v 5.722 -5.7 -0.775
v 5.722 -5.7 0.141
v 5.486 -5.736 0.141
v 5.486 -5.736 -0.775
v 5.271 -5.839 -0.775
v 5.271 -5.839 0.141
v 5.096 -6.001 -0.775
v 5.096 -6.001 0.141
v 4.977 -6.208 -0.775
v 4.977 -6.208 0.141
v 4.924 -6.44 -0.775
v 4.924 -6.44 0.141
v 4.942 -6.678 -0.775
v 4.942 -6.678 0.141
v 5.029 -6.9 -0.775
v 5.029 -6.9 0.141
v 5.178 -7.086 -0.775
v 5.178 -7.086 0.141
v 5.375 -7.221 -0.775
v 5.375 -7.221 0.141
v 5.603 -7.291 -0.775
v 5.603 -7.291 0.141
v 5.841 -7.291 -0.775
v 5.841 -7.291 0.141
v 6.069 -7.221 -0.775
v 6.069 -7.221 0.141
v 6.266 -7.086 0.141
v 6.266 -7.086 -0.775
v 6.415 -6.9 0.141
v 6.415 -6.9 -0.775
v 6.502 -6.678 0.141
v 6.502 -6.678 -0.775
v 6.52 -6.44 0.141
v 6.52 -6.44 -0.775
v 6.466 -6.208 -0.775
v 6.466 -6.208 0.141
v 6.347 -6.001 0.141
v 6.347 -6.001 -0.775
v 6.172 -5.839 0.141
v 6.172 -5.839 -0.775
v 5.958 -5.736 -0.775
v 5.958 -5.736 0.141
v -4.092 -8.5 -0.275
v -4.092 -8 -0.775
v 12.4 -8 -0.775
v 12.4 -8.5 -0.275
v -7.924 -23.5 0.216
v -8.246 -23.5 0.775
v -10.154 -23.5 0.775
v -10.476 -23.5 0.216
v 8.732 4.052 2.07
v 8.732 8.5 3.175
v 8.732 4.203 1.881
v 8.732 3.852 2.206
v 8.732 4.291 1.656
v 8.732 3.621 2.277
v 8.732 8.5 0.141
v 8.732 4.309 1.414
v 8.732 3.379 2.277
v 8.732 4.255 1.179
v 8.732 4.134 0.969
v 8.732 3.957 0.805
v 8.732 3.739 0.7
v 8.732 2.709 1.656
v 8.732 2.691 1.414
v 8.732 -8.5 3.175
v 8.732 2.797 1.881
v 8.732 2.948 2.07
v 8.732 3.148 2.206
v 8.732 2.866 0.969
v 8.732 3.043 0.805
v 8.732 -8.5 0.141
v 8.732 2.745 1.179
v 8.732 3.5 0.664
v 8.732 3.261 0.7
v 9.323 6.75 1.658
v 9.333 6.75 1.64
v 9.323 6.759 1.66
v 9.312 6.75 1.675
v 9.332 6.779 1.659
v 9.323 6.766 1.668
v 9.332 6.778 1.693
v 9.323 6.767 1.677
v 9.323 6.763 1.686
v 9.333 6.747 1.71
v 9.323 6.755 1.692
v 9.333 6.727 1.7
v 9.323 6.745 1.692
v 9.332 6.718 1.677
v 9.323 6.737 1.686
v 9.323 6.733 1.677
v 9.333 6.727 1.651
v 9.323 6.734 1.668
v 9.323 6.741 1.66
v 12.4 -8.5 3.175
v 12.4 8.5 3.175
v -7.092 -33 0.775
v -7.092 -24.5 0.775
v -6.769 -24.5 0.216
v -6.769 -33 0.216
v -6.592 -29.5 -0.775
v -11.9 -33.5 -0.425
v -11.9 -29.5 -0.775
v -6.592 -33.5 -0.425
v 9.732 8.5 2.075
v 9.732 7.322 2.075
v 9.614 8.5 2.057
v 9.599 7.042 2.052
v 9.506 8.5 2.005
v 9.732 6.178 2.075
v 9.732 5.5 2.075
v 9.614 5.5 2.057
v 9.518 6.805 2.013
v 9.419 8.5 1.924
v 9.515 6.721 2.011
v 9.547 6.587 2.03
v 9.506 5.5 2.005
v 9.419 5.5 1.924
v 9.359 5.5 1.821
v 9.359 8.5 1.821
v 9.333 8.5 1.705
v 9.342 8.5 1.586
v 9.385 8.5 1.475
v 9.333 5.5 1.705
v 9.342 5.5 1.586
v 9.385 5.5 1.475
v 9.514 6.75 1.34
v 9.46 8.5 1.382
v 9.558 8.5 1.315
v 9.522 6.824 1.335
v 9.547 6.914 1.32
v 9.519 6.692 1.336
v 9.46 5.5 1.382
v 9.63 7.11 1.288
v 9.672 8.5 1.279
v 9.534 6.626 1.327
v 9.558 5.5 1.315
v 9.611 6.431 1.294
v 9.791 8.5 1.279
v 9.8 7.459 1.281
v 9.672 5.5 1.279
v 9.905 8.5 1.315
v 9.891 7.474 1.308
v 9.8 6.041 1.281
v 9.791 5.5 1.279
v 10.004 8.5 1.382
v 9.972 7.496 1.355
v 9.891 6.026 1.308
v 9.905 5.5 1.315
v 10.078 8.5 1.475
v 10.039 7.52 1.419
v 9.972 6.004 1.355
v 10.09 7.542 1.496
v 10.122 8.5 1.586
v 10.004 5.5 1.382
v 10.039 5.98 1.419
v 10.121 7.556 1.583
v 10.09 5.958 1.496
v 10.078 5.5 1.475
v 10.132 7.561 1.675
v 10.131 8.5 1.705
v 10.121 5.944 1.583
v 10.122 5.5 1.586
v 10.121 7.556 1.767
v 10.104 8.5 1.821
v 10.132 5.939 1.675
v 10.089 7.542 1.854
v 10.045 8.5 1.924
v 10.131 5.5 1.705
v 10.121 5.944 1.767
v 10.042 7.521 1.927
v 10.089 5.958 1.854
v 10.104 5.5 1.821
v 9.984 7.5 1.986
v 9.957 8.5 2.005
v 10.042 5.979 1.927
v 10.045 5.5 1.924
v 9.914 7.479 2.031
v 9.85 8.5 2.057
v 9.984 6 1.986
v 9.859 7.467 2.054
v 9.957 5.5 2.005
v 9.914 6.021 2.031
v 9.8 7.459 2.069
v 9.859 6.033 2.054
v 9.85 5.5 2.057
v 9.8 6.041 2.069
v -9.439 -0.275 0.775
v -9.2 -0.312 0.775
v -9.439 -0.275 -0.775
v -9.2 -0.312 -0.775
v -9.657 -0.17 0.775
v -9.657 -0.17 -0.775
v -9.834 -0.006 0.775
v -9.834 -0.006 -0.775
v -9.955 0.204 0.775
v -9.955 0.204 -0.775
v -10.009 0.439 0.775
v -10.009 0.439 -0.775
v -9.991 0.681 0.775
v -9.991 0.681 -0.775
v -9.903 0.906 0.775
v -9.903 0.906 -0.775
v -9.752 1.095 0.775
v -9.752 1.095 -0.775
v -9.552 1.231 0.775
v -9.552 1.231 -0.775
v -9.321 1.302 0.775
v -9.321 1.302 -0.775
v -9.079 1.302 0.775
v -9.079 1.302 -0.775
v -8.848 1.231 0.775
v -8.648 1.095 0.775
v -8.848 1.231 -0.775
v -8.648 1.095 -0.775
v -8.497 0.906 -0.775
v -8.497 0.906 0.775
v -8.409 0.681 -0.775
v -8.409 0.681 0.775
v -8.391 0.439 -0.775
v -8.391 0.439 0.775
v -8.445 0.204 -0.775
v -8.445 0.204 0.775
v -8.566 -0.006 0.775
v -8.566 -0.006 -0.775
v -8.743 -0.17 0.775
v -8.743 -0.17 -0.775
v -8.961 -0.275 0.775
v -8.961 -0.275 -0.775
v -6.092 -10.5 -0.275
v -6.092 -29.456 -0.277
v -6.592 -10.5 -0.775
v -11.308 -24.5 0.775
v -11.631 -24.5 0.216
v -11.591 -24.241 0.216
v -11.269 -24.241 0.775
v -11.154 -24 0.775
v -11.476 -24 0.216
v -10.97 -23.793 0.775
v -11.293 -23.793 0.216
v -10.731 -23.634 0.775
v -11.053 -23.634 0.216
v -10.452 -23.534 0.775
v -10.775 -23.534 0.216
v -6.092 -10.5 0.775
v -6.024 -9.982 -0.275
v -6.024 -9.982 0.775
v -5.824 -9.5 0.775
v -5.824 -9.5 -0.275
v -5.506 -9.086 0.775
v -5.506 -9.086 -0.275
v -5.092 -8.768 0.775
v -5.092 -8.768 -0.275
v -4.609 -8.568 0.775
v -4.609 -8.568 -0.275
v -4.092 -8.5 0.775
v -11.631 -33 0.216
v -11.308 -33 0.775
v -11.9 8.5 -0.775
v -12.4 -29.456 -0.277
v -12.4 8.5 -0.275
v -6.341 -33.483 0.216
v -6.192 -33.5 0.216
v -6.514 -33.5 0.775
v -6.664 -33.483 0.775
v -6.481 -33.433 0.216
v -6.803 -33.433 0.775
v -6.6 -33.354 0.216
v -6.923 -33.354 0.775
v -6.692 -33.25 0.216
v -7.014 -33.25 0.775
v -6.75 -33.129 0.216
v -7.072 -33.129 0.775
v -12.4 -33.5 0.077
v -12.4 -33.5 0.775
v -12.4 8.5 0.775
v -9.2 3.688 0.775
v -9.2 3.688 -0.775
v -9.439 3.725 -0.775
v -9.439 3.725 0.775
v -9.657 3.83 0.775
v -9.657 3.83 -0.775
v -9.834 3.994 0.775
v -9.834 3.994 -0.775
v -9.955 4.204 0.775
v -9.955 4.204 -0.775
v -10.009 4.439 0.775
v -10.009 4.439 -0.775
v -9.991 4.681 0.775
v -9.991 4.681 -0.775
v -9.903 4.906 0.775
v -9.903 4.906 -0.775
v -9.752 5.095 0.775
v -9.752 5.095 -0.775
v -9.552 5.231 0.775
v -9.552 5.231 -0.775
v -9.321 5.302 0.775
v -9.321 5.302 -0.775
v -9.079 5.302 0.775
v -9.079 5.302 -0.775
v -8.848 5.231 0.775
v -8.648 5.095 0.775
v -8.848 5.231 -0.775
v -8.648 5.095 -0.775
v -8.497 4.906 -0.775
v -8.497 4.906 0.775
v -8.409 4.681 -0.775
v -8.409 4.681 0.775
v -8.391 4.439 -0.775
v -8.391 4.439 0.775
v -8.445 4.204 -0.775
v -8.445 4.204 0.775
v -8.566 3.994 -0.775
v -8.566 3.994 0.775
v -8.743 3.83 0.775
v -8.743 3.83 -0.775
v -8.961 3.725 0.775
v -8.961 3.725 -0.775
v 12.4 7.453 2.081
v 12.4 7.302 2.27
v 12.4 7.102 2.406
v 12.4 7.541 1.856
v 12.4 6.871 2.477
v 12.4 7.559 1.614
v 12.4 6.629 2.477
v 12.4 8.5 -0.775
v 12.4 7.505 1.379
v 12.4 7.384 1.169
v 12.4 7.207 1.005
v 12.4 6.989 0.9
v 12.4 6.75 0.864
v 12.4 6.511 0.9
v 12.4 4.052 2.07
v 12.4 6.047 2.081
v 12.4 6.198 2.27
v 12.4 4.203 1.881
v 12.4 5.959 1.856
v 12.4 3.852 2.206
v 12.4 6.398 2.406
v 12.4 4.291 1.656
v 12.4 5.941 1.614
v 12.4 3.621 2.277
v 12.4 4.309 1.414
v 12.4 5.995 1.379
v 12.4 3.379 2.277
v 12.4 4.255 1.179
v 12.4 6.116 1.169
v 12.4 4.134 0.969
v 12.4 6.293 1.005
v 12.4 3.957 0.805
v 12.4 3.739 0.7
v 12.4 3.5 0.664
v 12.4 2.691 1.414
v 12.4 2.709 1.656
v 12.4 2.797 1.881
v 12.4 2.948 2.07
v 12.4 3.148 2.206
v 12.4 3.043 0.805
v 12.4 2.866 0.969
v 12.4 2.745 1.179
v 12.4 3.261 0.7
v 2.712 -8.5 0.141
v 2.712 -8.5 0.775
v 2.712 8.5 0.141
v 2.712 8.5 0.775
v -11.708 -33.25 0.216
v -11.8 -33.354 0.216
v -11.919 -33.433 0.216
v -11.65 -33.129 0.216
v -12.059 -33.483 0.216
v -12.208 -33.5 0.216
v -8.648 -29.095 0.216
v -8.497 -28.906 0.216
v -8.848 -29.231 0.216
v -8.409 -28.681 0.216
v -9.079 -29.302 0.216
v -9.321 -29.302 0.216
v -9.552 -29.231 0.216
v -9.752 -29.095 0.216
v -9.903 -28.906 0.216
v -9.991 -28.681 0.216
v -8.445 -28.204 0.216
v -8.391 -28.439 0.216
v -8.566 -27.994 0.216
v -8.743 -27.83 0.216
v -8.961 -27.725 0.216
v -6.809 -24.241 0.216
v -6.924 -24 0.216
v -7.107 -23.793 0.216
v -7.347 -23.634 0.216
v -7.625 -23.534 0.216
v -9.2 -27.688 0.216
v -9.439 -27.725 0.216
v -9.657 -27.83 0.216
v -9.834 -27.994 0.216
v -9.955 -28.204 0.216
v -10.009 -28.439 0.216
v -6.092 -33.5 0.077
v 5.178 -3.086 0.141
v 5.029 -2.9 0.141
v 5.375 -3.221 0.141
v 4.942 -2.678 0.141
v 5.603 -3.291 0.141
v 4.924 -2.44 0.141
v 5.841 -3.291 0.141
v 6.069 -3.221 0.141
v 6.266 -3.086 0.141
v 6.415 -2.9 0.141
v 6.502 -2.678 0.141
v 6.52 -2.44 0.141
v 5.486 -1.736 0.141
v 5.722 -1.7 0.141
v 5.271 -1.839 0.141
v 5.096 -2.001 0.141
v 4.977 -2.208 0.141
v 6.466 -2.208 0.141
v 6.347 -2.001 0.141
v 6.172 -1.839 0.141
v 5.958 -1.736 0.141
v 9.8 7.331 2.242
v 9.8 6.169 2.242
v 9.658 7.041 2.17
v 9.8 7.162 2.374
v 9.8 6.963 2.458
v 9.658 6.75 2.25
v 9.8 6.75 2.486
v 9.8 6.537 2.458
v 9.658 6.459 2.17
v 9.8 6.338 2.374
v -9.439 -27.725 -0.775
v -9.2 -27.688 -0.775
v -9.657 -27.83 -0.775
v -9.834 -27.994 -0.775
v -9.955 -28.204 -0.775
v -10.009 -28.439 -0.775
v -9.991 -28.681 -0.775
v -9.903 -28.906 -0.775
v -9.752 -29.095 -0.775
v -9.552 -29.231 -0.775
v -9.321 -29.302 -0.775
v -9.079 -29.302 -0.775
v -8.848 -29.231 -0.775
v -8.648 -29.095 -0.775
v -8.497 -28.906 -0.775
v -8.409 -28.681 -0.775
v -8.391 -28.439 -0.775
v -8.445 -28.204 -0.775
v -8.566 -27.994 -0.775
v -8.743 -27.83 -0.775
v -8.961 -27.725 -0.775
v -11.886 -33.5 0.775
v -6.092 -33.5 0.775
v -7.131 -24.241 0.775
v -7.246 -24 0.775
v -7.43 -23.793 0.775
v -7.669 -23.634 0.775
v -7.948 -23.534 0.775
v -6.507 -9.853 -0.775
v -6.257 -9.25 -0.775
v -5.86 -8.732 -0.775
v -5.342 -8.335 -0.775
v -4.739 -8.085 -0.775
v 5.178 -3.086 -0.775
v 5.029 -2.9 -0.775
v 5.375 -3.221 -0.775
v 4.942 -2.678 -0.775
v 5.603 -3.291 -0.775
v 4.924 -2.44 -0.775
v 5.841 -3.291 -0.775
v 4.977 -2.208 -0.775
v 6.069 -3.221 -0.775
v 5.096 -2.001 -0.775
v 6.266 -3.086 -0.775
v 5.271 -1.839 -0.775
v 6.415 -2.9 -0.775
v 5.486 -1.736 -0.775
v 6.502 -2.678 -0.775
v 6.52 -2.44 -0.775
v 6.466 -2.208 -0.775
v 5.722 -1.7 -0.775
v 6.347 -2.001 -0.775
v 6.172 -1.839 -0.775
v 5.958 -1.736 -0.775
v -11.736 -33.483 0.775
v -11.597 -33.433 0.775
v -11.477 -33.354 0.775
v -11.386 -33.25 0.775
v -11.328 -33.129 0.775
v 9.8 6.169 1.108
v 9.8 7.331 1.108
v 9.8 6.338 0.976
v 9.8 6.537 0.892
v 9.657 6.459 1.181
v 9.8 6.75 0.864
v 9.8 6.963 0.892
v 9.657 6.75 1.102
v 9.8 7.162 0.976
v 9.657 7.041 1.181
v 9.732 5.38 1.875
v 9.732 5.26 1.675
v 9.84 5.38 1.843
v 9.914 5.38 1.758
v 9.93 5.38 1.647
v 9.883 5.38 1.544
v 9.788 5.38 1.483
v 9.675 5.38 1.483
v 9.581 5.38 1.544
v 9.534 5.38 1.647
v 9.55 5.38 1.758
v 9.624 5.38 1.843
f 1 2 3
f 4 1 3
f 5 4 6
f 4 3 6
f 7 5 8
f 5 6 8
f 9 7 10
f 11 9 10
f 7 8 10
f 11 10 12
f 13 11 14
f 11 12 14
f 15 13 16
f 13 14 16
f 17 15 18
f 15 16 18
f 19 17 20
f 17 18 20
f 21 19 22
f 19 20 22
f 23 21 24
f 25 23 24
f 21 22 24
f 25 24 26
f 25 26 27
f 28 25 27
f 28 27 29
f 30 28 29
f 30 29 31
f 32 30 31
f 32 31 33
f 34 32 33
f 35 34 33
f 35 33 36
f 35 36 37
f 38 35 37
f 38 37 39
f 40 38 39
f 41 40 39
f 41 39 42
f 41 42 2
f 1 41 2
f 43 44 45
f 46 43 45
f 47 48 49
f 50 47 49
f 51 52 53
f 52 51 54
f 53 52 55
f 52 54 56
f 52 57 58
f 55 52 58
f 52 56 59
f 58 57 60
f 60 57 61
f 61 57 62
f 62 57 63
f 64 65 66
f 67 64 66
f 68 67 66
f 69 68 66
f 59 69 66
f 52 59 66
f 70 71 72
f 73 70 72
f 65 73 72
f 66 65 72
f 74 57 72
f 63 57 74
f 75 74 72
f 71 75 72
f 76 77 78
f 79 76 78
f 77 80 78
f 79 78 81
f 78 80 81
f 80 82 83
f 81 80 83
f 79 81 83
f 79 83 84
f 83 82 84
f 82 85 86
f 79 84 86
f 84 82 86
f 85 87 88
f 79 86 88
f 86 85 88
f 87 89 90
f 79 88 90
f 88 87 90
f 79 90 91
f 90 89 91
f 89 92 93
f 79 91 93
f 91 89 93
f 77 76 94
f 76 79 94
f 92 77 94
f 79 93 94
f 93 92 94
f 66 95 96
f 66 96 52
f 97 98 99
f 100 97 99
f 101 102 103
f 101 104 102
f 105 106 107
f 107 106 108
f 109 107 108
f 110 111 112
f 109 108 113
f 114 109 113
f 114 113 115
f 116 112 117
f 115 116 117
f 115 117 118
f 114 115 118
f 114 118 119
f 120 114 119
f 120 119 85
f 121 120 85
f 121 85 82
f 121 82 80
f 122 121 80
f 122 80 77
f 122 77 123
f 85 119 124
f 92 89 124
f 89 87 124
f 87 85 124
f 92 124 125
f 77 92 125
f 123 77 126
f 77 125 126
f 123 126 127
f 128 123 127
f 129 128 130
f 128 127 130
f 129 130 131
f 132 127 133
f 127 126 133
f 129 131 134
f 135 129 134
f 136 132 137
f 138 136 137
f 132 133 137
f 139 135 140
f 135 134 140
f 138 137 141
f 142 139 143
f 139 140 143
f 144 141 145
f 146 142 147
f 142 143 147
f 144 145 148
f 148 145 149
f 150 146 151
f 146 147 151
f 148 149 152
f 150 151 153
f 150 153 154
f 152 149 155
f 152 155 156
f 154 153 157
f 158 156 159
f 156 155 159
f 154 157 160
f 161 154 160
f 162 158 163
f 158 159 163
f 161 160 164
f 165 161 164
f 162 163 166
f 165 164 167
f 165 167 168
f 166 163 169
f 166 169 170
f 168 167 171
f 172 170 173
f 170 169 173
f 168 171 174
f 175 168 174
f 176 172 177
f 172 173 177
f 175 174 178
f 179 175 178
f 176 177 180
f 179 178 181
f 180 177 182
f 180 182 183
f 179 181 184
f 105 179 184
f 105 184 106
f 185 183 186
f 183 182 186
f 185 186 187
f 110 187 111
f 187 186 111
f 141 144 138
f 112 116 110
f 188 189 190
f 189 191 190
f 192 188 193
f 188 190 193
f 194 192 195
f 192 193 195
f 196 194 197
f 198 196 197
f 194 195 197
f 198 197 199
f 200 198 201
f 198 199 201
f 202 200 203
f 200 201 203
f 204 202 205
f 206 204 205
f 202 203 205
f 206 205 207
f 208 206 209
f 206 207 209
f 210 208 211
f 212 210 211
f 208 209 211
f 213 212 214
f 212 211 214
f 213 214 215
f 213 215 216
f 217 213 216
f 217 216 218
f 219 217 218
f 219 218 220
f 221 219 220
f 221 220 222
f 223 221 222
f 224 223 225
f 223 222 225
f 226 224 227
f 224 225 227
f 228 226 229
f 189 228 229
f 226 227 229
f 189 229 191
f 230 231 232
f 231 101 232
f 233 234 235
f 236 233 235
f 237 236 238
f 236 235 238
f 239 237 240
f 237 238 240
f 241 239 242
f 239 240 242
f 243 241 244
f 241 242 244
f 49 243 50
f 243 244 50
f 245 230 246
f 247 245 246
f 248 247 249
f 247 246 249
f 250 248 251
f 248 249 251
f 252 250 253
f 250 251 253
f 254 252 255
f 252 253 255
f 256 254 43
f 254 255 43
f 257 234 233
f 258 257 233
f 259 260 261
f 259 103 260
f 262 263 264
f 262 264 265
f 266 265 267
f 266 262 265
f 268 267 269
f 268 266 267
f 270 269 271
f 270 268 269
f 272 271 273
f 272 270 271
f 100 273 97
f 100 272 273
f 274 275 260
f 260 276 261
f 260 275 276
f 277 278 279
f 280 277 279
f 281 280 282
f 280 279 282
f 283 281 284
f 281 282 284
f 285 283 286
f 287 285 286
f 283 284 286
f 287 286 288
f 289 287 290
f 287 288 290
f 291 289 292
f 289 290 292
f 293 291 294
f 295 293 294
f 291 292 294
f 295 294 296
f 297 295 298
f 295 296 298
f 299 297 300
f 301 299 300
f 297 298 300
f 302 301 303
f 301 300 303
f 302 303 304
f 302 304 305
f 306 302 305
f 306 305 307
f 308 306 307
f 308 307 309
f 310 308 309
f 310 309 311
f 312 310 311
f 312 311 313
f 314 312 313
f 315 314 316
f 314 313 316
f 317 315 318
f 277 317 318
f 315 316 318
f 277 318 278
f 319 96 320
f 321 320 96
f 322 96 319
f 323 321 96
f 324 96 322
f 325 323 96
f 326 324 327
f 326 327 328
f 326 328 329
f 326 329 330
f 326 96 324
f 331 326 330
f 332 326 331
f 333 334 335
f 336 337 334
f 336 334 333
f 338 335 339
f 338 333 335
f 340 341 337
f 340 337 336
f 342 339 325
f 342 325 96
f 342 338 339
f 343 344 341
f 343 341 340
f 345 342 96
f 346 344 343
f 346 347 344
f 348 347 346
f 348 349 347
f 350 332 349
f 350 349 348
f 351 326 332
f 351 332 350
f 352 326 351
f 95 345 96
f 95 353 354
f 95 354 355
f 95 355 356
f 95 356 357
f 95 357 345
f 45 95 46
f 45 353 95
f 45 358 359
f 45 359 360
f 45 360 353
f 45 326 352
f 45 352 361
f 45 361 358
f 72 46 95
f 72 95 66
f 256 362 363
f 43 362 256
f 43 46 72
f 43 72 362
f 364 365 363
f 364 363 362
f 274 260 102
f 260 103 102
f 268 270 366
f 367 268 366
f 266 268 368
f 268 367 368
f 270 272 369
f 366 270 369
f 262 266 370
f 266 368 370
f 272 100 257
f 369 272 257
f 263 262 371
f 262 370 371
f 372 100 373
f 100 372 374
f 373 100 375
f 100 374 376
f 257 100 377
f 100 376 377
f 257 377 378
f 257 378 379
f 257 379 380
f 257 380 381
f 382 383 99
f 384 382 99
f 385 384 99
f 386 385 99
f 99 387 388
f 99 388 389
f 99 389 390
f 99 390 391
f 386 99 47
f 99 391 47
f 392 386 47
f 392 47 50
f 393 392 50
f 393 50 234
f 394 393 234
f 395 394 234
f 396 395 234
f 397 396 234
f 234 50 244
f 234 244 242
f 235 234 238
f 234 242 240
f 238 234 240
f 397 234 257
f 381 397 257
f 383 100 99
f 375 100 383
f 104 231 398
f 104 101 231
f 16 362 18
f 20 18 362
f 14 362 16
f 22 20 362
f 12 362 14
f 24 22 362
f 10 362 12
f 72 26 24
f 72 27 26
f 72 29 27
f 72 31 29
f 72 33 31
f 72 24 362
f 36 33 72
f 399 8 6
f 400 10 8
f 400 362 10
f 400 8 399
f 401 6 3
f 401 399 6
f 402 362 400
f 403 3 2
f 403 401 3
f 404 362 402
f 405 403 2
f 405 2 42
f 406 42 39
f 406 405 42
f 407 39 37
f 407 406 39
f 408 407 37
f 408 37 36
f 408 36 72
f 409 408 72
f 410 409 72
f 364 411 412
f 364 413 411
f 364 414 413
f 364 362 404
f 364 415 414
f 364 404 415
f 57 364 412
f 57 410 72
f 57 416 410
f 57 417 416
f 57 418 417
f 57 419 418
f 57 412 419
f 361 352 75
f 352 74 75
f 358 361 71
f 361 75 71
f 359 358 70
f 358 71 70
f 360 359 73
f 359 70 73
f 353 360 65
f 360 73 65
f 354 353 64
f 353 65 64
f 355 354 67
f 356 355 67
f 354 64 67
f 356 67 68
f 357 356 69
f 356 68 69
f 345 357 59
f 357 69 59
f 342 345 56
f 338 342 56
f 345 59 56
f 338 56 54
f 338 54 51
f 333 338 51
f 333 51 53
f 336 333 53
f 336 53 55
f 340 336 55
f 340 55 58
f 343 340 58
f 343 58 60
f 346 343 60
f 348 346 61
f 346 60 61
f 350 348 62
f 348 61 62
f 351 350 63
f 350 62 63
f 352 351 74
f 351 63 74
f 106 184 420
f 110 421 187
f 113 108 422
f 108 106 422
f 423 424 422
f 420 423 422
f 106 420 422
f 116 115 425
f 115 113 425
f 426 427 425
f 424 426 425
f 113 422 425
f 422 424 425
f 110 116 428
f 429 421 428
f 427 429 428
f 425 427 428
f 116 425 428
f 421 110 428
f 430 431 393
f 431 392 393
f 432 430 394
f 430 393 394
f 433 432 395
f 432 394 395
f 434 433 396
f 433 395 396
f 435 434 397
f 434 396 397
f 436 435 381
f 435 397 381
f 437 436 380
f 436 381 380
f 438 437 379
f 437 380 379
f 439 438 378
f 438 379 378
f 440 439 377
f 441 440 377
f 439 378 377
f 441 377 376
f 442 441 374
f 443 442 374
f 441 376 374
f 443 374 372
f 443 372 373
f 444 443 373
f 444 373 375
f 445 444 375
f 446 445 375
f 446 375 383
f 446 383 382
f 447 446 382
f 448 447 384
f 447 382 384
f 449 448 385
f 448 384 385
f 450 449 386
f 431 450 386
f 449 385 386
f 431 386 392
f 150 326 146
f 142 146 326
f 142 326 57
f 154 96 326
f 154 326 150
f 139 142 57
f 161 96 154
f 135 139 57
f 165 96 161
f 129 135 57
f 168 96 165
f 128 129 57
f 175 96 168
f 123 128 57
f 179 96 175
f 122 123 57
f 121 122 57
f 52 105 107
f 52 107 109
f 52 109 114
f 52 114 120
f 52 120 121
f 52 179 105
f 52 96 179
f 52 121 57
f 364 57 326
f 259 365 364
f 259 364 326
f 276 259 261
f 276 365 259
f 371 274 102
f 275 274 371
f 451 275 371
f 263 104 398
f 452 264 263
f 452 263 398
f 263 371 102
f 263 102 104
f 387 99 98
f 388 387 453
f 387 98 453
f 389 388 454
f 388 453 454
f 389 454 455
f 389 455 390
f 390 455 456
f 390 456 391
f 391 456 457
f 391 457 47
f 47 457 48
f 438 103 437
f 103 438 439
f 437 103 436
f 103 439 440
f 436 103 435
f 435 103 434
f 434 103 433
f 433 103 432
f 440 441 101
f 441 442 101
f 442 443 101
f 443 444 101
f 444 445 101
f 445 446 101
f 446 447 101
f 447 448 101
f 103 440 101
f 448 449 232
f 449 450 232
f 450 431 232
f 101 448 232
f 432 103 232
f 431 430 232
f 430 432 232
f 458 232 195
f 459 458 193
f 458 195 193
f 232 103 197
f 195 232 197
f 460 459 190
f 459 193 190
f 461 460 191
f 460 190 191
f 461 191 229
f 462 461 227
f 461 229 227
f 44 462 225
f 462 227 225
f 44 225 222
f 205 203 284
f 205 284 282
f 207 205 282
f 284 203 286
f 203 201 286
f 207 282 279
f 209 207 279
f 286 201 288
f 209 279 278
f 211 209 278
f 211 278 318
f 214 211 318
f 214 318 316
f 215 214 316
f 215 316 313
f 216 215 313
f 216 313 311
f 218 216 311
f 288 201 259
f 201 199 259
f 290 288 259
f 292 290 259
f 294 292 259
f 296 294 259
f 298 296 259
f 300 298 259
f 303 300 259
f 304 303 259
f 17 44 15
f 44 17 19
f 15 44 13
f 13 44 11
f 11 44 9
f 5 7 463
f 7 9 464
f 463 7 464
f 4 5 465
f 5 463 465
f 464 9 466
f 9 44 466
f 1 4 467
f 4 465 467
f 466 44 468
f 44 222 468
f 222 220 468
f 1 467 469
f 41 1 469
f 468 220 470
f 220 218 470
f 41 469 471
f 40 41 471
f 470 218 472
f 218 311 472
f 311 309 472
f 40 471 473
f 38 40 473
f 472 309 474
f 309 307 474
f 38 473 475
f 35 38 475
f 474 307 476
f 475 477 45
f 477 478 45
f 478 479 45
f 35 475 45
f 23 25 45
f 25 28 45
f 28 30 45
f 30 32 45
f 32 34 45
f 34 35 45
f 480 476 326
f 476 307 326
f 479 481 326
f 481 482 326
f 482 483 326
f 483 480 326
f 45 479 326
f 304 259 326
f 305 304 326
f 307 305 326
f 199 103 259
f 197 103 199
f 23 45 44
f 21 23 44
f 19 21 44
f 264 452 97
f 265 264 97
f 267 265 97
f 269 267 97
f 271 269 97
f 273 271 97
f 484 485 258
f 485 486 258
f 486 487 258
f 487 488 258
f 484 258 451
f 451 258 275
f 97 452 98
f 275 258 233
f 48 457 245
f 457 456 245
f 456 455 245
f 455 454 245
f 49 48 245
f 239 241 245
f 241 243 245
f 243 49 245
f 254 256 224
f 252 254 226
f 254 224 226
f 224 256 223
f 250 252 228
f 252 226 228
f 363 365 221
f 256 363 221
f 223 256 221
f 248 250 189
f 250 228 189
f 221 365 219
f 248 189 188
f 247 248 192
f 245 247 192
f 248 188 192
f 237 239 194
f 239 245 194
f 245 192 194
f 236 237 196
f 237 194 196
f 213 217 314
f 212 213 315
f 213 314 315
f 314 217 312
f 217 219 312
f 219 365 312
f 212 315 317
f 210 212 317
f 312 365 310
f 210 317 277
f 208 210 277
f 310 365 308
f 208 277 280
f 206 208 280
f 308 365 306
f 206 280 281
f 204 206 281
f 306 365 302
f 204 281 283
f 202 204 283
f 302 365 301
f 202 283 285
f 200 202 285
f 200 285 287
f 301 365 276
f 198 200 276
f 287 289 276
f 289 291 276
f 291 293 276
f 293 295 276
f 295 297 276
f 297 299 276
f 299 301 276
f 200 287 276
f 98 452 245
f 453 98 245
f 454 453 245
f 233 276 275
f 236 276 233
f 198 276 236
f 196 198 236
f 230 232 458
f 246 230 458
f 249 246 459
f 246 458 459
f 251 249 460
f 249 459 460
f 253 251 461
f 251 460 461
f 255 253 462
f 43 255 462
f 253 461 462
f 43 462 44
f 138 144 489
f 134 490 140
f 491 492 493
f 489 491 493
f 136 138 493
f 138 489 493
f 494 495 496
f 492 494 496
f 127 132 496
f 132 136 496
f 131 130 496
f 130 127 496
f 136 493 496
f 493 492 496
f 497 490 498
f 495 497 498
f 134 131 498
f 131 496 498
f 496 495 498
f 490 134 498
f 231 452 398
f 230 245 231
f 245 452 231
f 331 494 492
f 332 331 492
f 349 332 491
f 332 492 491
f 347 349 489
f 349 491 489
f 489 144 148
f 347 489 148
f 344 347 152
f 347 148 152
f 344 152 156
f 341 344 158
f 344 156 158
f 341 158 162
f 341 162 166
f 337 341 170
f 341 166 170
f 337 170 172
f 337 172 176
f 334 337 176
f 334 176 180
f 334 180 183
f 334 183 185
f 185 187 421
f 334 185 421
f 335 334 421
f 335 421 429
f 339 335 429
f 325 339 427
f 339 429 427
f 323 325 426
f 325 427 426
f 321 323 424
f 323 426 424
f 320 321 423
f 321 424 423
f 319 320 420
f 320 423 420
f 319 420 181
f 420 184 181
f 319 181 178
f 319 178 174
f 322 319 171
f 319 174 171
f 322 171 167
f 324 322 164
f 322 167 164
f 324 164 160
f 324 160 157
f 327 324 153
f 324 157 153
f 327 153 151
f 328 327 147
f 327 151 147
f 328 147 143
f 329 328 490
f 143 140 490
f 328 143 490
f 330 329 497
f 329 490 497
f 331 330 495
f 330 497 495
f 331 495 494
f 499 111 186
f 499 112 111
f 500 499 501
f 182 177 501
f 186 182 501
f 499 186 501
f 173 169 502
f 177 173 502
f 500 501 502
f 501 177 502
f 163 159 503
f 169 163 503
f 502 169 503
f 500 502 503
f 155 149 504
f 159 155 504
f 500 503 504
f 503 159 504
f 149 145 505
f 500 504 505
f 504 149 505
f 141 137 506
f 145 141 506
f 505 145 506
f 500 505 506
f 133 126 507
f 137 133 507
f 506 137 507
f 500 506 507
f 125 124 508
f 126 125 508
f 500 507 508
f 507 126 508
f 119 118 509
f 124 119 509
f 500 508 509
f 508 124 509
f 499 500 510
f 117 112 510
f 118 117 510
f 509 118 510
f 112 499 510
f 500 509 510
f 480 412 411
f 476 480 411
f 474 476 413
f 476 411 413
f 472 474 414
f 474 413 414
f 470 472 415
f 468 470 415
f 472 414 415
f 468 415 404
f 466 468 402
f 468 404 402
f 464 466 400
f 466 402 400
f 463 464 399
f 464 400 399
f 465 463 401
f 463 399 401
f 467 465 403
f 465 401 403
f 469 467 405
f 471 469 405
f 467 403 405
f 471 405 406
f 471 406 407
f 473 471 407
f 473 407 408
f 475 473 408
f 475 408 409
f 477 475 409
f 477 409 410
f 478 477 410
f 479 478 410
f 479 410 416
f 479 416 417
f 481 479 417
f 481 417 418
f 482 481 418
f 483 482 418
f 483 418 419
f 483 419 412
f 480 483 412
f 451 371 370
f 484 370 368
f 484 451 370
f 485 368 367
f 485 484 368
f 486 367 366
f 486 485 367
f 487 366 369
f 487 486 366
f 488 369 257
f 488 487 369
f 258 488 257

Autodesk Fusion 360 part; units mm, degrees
sketch "Sketch1" plane through (0, 0, 0) normal (0, 1, 0) x (1, 0, 0)
  line L0 (-12.4, 0.775) -> (12.4, 0.775)
  line L1 (12.4, 0.775) -> (12.4, -0.775)
  line L2 (12.4, -0.775) -> (-12.4, -0.775)
  line L3 (-12.4, -0.775) -> (-12.4, 0.775)
  line L4 (-12.4, 0.775) -> (12.4, -0.775) construction
  line L5 (12.4, 0.775) -> (-12.4, -0.775) construction
  dimension "d1" = 24.8
  dimension "d2" = 1.55
extrude "Extrude1" add sketch "Sketch1" along normal mid plane 17
sketch "Sketch4" plane through (0, 8.5, 0) normal (0, 1, 0) x (-1, 0, 0)
  line L0 (12.4, -0.775) -> (12.4, 0.775)
  line L1 (12.4, 0.775) -> (-12.4, 0.775)
  line L2 (-12.4, 0.775) -> (-12.4, -0.775)
  line L3 (-12.4, -0.775) -> (12.4, -0.775)
  line L4 (7.0918, 0.775) -> (6.7692, 0.2162)
  line L5 (6.7692, 0.2162) -> (11.6308, 0.2162)
  line L6 (11.6308, 0.2162) -> (11.3082, 0.775)
  point P0 (9.2, 0.2162)
  dimension "d11" = 60
  dimension "d12" = 60
  dimension "d13" = 4.2164
  dimension "d14" = 0.5588
  dimension "d47" = 3.2
extrude "Extrude3" cut sketch "Sketch4" against normal up to surface (17 mm away) contours L1 L4 L5 L6
sketch "Sketch2" plane through (0, 8.5, 0) normal (0, 1, 0) x (-1, 0, 0)
  line L0 (7.0918, 0.775) -> (-12.4, 0.775)
  line L1 (-12.4, 0.775) -> (-12.4, -0.775)
  line L2 (-12.4, -0.775) -> (12.4, -0.775)
  line L3 (12.4, -0.775) -> (12.4, 0.775)
  line L4 (-2.7118, 0.141) -> (-8.7318, 0.141)
  line L5 (-8.7318, 0.141) -> (-8.7318, 0.775)
  line L6 (-8.7318, 0.775) -> (-2.7118, 0.775)
  line L7 (-2.7118, 0.775) -> (-2.7118, 0.141)
  line L8 (6.7692, 0.2162) -> (7.0918, 0.775)
  line L9 (12.4, 0.775) -> (11.3082, 0.775)
  line L10 (11.3082, 0.775) -> (11.6308, 0.2162)
  line L11 (11.6308, 0.2162) -> (6.7692, 0.2162)
  dimension "d5" = 6.02
  dimension "d6" = 0.634
  dimension "d50" = 9.481
extrude "Extrude2" cut sketch "Sketch2" against normal up to surface (17 mm away) contours L0 L4 L5 L6 L7
sketch "Sketch6" plane through (0, 0, -0.775) normal (0, 0, -1) x (-1, 0, 0)
  line L0 (5.6836, 7) -> (5.6836, -7)
  line L1 (5.6836, -7) -> (6.75, -7)
  line L2 (6.75, -7) -> (6.75, 7)
  line L3 (6.75, 7) -> (5.6836, 7)
  line L4 (-0.15, 7) -> (-6.25, 7)
  line L5 (-5.7218, -6.5) -> (-5.7218, -2.5)
  line L6 (12.4, -8.5) -> (12.4, 8.5)
  line L7 (12.4, 8.5) -> (-12.4, 8.5)
  line L8 (-12.4, 8.5) -> (-12.4, -8.5)
  line L9 (-12.4, -8.5) -> (12.4, -8.5)
  curve L10
  line L11 (-2.7118, -8.5) -> (-8.7318, -8.5)
  line L12 (-8.7318, -8.5) -> (-8.7318, 8.5)
  line L13 (-8.7318, 8.5) -> (-2.7118, 8.5)
  line L14 (-2.7118, 8.5) -> (-2.7118, -8.5)
  point P0 (-5.7218, 7)
  point P1 (-5.7218, -2.5)
  point P2 (-5.7218, -6.5)
  point P3 (6.75, 0)
  point P4 (-5.7218, -4.5)
  point P5 (-5.7218, -8.5)
  point P6 (-5.7218, -8.5)
  dimension "d22" = 4
  dimension "d51" = 2
hole "Hole2" at (5.7218, -2.5, -0.775) at (5.7218, -6.5, -0.775) direction (0, 0, 1) diameter 1.6 depth 3.517 tip angle 118
sketch "Sketch7" plane through (0, 0, -0.775) normal (0, 0, -1) x (-1, 0, 0)
  line L0 (5.6836, 7) -> (5.6836, -7)
  line L1 (5.6836, -7) -> (6.75, -7)
  line L2 (6.75, -7) -> (6.75, 7)
  line L3 (6.75, 7) -> (5.6836, 7)
  line L4 (-6.25, -7) -> (-0.15, -7)
  circle A0 centre (-5.7218, -2.5) radius 0.8
  circle A1 centre (-5.7218, -6.5) radius 0.8
  line L5 (12.4, -8.5) -> (12.4, 8.5)
  line L6 (12.4, 8.5) -> (-12.4, 8.5)
  line L7 (-12.4, 8.5) -> (-12.4, -8.5)
  line L8 (-12.4, -8.5) -> (12.4, -8.5)
  point P0 (-3.2, -7)
  point P1 (-3.2, -4.5)
  dimension "d26" = 2.5
hole "Hole3" [suppressed]
extrude "Extrude4" add 1 faces at (11.1773, -2.8333, 0.775) along direction (0, 0, 1) blind 2.4
sketch "Sketch10" plane through (12.4, 0, 0) normal (1, 0, 0) x (0, 1, 0)
  line L0 (-8.5, -0.775) -> (8.5, -0.775)
  line L1 (8.5, -0.775) -> (8.5, 3.175)
  line L2 (8.5, 3.175) -> (-8.5, 3.175)
  line L3 (-8.5, 3.175) -> (-8.5, -0.775)
  point P0 (3.5, 1.475)
  dimension "d54" = 2.25
  dimension "d59" = 12
hole "Hole6" at (12.4, 3.5, 1.475) direction (-1, 0, 0) diameter 1.623 depth 6.5 tip angle 118
sketch "Sketch11" plane through (0, 8.5, 0) normal (0, 1, 0) x (-1, 0, 0)
  line L0 (11.6308, 0.2162) -> (6.7692, 0.2162)
  line L1 (7.0918, 0.775) -> (-2.7118, 0.775)
  line L2 (-2.7118, 0.775) -> (-2.7118, 0.141)
  line L3 (-2.7118, 0.141) -> (-8.7318, 0.141)
  line L4 (-8.7318, 0.141) -> (-8.7318, 3.175)
  line L5 (-8.7318, 3.175) -> (-12.4, 3.175)
  line L6 (-12.4, 3.175) -> (-12.4, -0.775)
  line L7 (-12.4, -0.775) -> (12.4, -0.775)
  line L8 (12.4, -0.775) -> (12.4, 0.775)
  line L9 (12.4, 0.775) -> (11.3082, 0.775)
  line L10 (11.3082, 0.775) -> (11.6308, 0.2162)
  line L11 (6.7692, 0.2162) -> (7.0918, 0.775)
  point P0 (-9.7318, 1.675)
  dimension "d60" = 1.5
  dimension "d61" = 1
hole "Hole7" at (9.7318, 8.5, 1.675) direction (0, -1, 0) diameter 0.8 depth 3 tip angle 118
sketch "Sketch12" plane through (12.4, 0, 0) normal (1, 0, 0) x (0, 1, 0)
  circle A0 centre (3.5, 1.475) radius 0.8115
  line L0 (-8.5, -0.775) -> (8.5, -0.775)
  line L1 (8.5, -0.775) -> (8.5, 3.175)
  line L2 (8.5, 3.175) -> (-8.5, 3.175)
  line L3 (-8.5, 3.175) -> (-8.5, -0.775)
  line L4 (8.5, 2.075) -> (8.5, 1.275)
  line L5 (5.5, 2.075) -> (5.5, 1.275)
  point P0 (6.75, 1.675)
  point P1 (8.5, 1.675)
  dimension "d66" = 1.75
hole "Hole8" at (12.4, 6.75, 1.675) direction (-1, 0, 0) diameter 1.623 depth 2.6 tip angle 118
fillet "Fillet1" [suppressed]
sketch "Sketch13" plane through (0, -8.5, 0) normal (0, -1, 0) x (1, 0, 0)
  line L0 (8.7318, 3.175) -> (8.7318, 0.141)
  line L1 (8.7318, 0.141) -> (2.7118, 0.141)
  line L2 (2.7118, 0.141) -> (2.7118, 0.775)
  line L3 (2.7118, 0.775) -> (-7.0918, 0.775)
  line L4 (-7.0918, 0.775) -> (-6.7692, 0.2162)
  line L5 (-6.7692, 0.2162) -> (-11.6308, 0.2162)
  line L6 (-11.6308, 0.2162) -> (-11.3082, 0.775)
  line L7 (-11.3082, 0.775) -> (-12.4, 0.775)
  line L8 (-12.4, 0.775) -> (-12.4, -0.775)
  line L9 (-12.4, -0.775) -> (12.4, -0.775)
  line L10 (12.4, -0.775) -> (12.4, 3.175)
  line L11 (12.4, 3.175) -> (8.7318, 3.175)
  line L12 (2.7118, 0.141) -> (2.7118, -0.775)
  line L13 (-6.0918, 0.775) -> (-6.0918, -0.775)
  dimension "d78" = 1
extrude "Extrude5" add sketch "Sketch13" along normal blind 25 contours L3 L4 L5 L6 L7 L8 L9 L13
sketch "Sketch5" plane through (0, 0, -0.775) normal (0, 0, -1) x (1, 0, 0)
  line L0 (-12.4, -8.5) -> (12.4, -8.5)
  line L1 (12.4, -8.5) -> (12.4, 8.5)
  line L2 (12.4, 8.5) -> (-6.0918, 8.5)
  line L3 (-12.4, 33.5) -> (-12.4, -8.5)
  circle A0 centre (5.7218, 2.5) radius 0.8
  circle A1 centre (5.7218, 6.5) radius 0.8
  line L4 (-6.0918, 33.5) -> (-12.4, 33.5)
  line L5 (-6.7692, 33.5) -> (-11.6308, 33.5)
  line L6 (-6.0918, 8.5) -> (-6.0918, 33.5)
  point P0 (-9.2, 33.5)
  point P1 (-9.2, 28.5)
  dimension "d72" = 5
hole "Hole1" at (-9.2, -28.5, -0.775) direction (0, 0, 1) diameter 1.623 end through all
sketch "Sketch14" plane through (-6.0918, 0, 0) normal (1, 0, 0) x (0, 1, 0)
  line L0 (-8.5, 0.243) -> (8.5, 0.243)
  line L1 (8.5, 0.243) -> (8.5, 0.875)
  line L2 (8.5, 0.875) -> (-8.5, 0.875)
  line L3 (-8.5, 0.875) -> (-8.5, 0.243)
  line L4 (-33.5, -0.425) -> (-29.5, -0.775)
  line L5 (-8.5, -0.775) -> (-8.5, 0.775)
  line L6 (-8.5, 0.775) -> (-33.5, 0.775)
  line L7 (-33.5, 0.775) -> (-33.5, -0.775)
  line L8 (-33.5, -0.775) -> (-8.5, -0.775)
  dimension "d88" = 4
  dimension "d89" = 0.35
extrude "Extrude6" cut sketch "Sketch14" against normal through all contours L4 L7 L8
fillet "Fillet2" radius 0.5 2 edges at (-11.4695, -33.5, 0.4956) (-6.9305, -33.5, 0.4956)
sketch "Sketch15" plane through (0, 8.5, 0) normal (0, 1, 0) x (-1, 0, 0)
  circle A0 centre (-9.7318, 1.675) radius 0.4
  line L0 (-8.7318, 0.141) -> (-8.7318, 3.175)
  line L1 (-8.7318, 3.175) -> (-12.4, 3.175)
  line L2 (-12.4, 3.175) -> (-12.4, -0.775)
  line L3 (-12.4, -0.775) -> (12.4, -0.775)
  line L4 (12.4, -0.775) -> (12.4, 0.775)
  line L5 (12.4, 0.775) -> (11.3082, 0.775)
  line L6 (11.3082, 0.775) -> (11.6308, 0.2162)
  line L7 (11.6308, 0.2162) -> (6.7692, 0.2162)
  line L8 (6.7692, 0.2162) -> (7.0918, 0.775)
  line L9 (7.0918, 0.775) -> (-2.7118, 0.775)
  line L10 (-2.7118, 0.775) -> (-2.7118, 0.141)
  line L11 (-2.7118, 0.141) -> (-8.7318, 0.141)
  line L12 (7.0918, 0.775) -> (11.3082, 0.775)
extrude "Extrude7" add sketch "Sketch15" against normal blind 32 contours L6 L7 L8 L12
sketch "Sketch16" plane through (0, 0, 0.775) normal (0, 0, 1) x (-1, 0, 0)
  ellipse E0 centre (11.8856, 33) end of major axis (11.3082, 33) minor radius 0.5 (11.8856, 33.5) -> (11.3082, 33) ccw
  line L0 (11.3082, 33) -> (11.3082, 23.5)
  line L1 (11.3082, 23.5) -> (7.0918, 23.5)
  line L2 (7.0918, 23.5) -> (7.0918, 33)
  ellipse E1 centre (6.5144, 33) end of major axis (7.0918, 33) minor radius 0.5 (7.0918, 33) -> (6.5144, 33.5) ccw
  line L3 (6.5144, 33.5) -> (6.0918, 33.5)
  line L4 (6.0918, 33.5) -> (6.0918, 8.5)
  line L5 (6.0918, 8.5) -> (-2.7118, 8.5)
  line L6 (-2.7118, 8.5) -> (-2.7118, -8.5)
  line L7 (-2.7118, -8.5) -> (12.4, -8.5)
  line L8 (12.4, -8.5) -> (12.4, 33.5)
  line L9 (12.4, 33.5) -> (11.8856, 33.5)
  point P0 (9.2, 23.5)
  point P1 (9.2, -4.5)
  point P2 (9.2, -0.5)
  dimension "d81" = 4
  dimension "d85" = 4
hole "Hole9" at (-9.2, 4.5, 0.775) at (-9.2, 0.5, 0.775) direction (0, 0, -1) diameter 1.623 depth 9 tip angle 118
fillet "Fillet3" radius 1 2 edges at (-6.9305, -23.5, 0.4956) (-11.4695, -23.5, 0.4956)
fillet "Fillet4" radius 2 1 edges at (-6.0918, -8.5, 0)
chamfer "Chamfer1" distance 0.5 angle 45 3 edges at (-6.0918, -31.5, -0.6) (-12.4, -31.5, -0.6) (-12.4, -10.5, -0.775)
equation "d6 = 0.75 mm - 0.116 mm"
